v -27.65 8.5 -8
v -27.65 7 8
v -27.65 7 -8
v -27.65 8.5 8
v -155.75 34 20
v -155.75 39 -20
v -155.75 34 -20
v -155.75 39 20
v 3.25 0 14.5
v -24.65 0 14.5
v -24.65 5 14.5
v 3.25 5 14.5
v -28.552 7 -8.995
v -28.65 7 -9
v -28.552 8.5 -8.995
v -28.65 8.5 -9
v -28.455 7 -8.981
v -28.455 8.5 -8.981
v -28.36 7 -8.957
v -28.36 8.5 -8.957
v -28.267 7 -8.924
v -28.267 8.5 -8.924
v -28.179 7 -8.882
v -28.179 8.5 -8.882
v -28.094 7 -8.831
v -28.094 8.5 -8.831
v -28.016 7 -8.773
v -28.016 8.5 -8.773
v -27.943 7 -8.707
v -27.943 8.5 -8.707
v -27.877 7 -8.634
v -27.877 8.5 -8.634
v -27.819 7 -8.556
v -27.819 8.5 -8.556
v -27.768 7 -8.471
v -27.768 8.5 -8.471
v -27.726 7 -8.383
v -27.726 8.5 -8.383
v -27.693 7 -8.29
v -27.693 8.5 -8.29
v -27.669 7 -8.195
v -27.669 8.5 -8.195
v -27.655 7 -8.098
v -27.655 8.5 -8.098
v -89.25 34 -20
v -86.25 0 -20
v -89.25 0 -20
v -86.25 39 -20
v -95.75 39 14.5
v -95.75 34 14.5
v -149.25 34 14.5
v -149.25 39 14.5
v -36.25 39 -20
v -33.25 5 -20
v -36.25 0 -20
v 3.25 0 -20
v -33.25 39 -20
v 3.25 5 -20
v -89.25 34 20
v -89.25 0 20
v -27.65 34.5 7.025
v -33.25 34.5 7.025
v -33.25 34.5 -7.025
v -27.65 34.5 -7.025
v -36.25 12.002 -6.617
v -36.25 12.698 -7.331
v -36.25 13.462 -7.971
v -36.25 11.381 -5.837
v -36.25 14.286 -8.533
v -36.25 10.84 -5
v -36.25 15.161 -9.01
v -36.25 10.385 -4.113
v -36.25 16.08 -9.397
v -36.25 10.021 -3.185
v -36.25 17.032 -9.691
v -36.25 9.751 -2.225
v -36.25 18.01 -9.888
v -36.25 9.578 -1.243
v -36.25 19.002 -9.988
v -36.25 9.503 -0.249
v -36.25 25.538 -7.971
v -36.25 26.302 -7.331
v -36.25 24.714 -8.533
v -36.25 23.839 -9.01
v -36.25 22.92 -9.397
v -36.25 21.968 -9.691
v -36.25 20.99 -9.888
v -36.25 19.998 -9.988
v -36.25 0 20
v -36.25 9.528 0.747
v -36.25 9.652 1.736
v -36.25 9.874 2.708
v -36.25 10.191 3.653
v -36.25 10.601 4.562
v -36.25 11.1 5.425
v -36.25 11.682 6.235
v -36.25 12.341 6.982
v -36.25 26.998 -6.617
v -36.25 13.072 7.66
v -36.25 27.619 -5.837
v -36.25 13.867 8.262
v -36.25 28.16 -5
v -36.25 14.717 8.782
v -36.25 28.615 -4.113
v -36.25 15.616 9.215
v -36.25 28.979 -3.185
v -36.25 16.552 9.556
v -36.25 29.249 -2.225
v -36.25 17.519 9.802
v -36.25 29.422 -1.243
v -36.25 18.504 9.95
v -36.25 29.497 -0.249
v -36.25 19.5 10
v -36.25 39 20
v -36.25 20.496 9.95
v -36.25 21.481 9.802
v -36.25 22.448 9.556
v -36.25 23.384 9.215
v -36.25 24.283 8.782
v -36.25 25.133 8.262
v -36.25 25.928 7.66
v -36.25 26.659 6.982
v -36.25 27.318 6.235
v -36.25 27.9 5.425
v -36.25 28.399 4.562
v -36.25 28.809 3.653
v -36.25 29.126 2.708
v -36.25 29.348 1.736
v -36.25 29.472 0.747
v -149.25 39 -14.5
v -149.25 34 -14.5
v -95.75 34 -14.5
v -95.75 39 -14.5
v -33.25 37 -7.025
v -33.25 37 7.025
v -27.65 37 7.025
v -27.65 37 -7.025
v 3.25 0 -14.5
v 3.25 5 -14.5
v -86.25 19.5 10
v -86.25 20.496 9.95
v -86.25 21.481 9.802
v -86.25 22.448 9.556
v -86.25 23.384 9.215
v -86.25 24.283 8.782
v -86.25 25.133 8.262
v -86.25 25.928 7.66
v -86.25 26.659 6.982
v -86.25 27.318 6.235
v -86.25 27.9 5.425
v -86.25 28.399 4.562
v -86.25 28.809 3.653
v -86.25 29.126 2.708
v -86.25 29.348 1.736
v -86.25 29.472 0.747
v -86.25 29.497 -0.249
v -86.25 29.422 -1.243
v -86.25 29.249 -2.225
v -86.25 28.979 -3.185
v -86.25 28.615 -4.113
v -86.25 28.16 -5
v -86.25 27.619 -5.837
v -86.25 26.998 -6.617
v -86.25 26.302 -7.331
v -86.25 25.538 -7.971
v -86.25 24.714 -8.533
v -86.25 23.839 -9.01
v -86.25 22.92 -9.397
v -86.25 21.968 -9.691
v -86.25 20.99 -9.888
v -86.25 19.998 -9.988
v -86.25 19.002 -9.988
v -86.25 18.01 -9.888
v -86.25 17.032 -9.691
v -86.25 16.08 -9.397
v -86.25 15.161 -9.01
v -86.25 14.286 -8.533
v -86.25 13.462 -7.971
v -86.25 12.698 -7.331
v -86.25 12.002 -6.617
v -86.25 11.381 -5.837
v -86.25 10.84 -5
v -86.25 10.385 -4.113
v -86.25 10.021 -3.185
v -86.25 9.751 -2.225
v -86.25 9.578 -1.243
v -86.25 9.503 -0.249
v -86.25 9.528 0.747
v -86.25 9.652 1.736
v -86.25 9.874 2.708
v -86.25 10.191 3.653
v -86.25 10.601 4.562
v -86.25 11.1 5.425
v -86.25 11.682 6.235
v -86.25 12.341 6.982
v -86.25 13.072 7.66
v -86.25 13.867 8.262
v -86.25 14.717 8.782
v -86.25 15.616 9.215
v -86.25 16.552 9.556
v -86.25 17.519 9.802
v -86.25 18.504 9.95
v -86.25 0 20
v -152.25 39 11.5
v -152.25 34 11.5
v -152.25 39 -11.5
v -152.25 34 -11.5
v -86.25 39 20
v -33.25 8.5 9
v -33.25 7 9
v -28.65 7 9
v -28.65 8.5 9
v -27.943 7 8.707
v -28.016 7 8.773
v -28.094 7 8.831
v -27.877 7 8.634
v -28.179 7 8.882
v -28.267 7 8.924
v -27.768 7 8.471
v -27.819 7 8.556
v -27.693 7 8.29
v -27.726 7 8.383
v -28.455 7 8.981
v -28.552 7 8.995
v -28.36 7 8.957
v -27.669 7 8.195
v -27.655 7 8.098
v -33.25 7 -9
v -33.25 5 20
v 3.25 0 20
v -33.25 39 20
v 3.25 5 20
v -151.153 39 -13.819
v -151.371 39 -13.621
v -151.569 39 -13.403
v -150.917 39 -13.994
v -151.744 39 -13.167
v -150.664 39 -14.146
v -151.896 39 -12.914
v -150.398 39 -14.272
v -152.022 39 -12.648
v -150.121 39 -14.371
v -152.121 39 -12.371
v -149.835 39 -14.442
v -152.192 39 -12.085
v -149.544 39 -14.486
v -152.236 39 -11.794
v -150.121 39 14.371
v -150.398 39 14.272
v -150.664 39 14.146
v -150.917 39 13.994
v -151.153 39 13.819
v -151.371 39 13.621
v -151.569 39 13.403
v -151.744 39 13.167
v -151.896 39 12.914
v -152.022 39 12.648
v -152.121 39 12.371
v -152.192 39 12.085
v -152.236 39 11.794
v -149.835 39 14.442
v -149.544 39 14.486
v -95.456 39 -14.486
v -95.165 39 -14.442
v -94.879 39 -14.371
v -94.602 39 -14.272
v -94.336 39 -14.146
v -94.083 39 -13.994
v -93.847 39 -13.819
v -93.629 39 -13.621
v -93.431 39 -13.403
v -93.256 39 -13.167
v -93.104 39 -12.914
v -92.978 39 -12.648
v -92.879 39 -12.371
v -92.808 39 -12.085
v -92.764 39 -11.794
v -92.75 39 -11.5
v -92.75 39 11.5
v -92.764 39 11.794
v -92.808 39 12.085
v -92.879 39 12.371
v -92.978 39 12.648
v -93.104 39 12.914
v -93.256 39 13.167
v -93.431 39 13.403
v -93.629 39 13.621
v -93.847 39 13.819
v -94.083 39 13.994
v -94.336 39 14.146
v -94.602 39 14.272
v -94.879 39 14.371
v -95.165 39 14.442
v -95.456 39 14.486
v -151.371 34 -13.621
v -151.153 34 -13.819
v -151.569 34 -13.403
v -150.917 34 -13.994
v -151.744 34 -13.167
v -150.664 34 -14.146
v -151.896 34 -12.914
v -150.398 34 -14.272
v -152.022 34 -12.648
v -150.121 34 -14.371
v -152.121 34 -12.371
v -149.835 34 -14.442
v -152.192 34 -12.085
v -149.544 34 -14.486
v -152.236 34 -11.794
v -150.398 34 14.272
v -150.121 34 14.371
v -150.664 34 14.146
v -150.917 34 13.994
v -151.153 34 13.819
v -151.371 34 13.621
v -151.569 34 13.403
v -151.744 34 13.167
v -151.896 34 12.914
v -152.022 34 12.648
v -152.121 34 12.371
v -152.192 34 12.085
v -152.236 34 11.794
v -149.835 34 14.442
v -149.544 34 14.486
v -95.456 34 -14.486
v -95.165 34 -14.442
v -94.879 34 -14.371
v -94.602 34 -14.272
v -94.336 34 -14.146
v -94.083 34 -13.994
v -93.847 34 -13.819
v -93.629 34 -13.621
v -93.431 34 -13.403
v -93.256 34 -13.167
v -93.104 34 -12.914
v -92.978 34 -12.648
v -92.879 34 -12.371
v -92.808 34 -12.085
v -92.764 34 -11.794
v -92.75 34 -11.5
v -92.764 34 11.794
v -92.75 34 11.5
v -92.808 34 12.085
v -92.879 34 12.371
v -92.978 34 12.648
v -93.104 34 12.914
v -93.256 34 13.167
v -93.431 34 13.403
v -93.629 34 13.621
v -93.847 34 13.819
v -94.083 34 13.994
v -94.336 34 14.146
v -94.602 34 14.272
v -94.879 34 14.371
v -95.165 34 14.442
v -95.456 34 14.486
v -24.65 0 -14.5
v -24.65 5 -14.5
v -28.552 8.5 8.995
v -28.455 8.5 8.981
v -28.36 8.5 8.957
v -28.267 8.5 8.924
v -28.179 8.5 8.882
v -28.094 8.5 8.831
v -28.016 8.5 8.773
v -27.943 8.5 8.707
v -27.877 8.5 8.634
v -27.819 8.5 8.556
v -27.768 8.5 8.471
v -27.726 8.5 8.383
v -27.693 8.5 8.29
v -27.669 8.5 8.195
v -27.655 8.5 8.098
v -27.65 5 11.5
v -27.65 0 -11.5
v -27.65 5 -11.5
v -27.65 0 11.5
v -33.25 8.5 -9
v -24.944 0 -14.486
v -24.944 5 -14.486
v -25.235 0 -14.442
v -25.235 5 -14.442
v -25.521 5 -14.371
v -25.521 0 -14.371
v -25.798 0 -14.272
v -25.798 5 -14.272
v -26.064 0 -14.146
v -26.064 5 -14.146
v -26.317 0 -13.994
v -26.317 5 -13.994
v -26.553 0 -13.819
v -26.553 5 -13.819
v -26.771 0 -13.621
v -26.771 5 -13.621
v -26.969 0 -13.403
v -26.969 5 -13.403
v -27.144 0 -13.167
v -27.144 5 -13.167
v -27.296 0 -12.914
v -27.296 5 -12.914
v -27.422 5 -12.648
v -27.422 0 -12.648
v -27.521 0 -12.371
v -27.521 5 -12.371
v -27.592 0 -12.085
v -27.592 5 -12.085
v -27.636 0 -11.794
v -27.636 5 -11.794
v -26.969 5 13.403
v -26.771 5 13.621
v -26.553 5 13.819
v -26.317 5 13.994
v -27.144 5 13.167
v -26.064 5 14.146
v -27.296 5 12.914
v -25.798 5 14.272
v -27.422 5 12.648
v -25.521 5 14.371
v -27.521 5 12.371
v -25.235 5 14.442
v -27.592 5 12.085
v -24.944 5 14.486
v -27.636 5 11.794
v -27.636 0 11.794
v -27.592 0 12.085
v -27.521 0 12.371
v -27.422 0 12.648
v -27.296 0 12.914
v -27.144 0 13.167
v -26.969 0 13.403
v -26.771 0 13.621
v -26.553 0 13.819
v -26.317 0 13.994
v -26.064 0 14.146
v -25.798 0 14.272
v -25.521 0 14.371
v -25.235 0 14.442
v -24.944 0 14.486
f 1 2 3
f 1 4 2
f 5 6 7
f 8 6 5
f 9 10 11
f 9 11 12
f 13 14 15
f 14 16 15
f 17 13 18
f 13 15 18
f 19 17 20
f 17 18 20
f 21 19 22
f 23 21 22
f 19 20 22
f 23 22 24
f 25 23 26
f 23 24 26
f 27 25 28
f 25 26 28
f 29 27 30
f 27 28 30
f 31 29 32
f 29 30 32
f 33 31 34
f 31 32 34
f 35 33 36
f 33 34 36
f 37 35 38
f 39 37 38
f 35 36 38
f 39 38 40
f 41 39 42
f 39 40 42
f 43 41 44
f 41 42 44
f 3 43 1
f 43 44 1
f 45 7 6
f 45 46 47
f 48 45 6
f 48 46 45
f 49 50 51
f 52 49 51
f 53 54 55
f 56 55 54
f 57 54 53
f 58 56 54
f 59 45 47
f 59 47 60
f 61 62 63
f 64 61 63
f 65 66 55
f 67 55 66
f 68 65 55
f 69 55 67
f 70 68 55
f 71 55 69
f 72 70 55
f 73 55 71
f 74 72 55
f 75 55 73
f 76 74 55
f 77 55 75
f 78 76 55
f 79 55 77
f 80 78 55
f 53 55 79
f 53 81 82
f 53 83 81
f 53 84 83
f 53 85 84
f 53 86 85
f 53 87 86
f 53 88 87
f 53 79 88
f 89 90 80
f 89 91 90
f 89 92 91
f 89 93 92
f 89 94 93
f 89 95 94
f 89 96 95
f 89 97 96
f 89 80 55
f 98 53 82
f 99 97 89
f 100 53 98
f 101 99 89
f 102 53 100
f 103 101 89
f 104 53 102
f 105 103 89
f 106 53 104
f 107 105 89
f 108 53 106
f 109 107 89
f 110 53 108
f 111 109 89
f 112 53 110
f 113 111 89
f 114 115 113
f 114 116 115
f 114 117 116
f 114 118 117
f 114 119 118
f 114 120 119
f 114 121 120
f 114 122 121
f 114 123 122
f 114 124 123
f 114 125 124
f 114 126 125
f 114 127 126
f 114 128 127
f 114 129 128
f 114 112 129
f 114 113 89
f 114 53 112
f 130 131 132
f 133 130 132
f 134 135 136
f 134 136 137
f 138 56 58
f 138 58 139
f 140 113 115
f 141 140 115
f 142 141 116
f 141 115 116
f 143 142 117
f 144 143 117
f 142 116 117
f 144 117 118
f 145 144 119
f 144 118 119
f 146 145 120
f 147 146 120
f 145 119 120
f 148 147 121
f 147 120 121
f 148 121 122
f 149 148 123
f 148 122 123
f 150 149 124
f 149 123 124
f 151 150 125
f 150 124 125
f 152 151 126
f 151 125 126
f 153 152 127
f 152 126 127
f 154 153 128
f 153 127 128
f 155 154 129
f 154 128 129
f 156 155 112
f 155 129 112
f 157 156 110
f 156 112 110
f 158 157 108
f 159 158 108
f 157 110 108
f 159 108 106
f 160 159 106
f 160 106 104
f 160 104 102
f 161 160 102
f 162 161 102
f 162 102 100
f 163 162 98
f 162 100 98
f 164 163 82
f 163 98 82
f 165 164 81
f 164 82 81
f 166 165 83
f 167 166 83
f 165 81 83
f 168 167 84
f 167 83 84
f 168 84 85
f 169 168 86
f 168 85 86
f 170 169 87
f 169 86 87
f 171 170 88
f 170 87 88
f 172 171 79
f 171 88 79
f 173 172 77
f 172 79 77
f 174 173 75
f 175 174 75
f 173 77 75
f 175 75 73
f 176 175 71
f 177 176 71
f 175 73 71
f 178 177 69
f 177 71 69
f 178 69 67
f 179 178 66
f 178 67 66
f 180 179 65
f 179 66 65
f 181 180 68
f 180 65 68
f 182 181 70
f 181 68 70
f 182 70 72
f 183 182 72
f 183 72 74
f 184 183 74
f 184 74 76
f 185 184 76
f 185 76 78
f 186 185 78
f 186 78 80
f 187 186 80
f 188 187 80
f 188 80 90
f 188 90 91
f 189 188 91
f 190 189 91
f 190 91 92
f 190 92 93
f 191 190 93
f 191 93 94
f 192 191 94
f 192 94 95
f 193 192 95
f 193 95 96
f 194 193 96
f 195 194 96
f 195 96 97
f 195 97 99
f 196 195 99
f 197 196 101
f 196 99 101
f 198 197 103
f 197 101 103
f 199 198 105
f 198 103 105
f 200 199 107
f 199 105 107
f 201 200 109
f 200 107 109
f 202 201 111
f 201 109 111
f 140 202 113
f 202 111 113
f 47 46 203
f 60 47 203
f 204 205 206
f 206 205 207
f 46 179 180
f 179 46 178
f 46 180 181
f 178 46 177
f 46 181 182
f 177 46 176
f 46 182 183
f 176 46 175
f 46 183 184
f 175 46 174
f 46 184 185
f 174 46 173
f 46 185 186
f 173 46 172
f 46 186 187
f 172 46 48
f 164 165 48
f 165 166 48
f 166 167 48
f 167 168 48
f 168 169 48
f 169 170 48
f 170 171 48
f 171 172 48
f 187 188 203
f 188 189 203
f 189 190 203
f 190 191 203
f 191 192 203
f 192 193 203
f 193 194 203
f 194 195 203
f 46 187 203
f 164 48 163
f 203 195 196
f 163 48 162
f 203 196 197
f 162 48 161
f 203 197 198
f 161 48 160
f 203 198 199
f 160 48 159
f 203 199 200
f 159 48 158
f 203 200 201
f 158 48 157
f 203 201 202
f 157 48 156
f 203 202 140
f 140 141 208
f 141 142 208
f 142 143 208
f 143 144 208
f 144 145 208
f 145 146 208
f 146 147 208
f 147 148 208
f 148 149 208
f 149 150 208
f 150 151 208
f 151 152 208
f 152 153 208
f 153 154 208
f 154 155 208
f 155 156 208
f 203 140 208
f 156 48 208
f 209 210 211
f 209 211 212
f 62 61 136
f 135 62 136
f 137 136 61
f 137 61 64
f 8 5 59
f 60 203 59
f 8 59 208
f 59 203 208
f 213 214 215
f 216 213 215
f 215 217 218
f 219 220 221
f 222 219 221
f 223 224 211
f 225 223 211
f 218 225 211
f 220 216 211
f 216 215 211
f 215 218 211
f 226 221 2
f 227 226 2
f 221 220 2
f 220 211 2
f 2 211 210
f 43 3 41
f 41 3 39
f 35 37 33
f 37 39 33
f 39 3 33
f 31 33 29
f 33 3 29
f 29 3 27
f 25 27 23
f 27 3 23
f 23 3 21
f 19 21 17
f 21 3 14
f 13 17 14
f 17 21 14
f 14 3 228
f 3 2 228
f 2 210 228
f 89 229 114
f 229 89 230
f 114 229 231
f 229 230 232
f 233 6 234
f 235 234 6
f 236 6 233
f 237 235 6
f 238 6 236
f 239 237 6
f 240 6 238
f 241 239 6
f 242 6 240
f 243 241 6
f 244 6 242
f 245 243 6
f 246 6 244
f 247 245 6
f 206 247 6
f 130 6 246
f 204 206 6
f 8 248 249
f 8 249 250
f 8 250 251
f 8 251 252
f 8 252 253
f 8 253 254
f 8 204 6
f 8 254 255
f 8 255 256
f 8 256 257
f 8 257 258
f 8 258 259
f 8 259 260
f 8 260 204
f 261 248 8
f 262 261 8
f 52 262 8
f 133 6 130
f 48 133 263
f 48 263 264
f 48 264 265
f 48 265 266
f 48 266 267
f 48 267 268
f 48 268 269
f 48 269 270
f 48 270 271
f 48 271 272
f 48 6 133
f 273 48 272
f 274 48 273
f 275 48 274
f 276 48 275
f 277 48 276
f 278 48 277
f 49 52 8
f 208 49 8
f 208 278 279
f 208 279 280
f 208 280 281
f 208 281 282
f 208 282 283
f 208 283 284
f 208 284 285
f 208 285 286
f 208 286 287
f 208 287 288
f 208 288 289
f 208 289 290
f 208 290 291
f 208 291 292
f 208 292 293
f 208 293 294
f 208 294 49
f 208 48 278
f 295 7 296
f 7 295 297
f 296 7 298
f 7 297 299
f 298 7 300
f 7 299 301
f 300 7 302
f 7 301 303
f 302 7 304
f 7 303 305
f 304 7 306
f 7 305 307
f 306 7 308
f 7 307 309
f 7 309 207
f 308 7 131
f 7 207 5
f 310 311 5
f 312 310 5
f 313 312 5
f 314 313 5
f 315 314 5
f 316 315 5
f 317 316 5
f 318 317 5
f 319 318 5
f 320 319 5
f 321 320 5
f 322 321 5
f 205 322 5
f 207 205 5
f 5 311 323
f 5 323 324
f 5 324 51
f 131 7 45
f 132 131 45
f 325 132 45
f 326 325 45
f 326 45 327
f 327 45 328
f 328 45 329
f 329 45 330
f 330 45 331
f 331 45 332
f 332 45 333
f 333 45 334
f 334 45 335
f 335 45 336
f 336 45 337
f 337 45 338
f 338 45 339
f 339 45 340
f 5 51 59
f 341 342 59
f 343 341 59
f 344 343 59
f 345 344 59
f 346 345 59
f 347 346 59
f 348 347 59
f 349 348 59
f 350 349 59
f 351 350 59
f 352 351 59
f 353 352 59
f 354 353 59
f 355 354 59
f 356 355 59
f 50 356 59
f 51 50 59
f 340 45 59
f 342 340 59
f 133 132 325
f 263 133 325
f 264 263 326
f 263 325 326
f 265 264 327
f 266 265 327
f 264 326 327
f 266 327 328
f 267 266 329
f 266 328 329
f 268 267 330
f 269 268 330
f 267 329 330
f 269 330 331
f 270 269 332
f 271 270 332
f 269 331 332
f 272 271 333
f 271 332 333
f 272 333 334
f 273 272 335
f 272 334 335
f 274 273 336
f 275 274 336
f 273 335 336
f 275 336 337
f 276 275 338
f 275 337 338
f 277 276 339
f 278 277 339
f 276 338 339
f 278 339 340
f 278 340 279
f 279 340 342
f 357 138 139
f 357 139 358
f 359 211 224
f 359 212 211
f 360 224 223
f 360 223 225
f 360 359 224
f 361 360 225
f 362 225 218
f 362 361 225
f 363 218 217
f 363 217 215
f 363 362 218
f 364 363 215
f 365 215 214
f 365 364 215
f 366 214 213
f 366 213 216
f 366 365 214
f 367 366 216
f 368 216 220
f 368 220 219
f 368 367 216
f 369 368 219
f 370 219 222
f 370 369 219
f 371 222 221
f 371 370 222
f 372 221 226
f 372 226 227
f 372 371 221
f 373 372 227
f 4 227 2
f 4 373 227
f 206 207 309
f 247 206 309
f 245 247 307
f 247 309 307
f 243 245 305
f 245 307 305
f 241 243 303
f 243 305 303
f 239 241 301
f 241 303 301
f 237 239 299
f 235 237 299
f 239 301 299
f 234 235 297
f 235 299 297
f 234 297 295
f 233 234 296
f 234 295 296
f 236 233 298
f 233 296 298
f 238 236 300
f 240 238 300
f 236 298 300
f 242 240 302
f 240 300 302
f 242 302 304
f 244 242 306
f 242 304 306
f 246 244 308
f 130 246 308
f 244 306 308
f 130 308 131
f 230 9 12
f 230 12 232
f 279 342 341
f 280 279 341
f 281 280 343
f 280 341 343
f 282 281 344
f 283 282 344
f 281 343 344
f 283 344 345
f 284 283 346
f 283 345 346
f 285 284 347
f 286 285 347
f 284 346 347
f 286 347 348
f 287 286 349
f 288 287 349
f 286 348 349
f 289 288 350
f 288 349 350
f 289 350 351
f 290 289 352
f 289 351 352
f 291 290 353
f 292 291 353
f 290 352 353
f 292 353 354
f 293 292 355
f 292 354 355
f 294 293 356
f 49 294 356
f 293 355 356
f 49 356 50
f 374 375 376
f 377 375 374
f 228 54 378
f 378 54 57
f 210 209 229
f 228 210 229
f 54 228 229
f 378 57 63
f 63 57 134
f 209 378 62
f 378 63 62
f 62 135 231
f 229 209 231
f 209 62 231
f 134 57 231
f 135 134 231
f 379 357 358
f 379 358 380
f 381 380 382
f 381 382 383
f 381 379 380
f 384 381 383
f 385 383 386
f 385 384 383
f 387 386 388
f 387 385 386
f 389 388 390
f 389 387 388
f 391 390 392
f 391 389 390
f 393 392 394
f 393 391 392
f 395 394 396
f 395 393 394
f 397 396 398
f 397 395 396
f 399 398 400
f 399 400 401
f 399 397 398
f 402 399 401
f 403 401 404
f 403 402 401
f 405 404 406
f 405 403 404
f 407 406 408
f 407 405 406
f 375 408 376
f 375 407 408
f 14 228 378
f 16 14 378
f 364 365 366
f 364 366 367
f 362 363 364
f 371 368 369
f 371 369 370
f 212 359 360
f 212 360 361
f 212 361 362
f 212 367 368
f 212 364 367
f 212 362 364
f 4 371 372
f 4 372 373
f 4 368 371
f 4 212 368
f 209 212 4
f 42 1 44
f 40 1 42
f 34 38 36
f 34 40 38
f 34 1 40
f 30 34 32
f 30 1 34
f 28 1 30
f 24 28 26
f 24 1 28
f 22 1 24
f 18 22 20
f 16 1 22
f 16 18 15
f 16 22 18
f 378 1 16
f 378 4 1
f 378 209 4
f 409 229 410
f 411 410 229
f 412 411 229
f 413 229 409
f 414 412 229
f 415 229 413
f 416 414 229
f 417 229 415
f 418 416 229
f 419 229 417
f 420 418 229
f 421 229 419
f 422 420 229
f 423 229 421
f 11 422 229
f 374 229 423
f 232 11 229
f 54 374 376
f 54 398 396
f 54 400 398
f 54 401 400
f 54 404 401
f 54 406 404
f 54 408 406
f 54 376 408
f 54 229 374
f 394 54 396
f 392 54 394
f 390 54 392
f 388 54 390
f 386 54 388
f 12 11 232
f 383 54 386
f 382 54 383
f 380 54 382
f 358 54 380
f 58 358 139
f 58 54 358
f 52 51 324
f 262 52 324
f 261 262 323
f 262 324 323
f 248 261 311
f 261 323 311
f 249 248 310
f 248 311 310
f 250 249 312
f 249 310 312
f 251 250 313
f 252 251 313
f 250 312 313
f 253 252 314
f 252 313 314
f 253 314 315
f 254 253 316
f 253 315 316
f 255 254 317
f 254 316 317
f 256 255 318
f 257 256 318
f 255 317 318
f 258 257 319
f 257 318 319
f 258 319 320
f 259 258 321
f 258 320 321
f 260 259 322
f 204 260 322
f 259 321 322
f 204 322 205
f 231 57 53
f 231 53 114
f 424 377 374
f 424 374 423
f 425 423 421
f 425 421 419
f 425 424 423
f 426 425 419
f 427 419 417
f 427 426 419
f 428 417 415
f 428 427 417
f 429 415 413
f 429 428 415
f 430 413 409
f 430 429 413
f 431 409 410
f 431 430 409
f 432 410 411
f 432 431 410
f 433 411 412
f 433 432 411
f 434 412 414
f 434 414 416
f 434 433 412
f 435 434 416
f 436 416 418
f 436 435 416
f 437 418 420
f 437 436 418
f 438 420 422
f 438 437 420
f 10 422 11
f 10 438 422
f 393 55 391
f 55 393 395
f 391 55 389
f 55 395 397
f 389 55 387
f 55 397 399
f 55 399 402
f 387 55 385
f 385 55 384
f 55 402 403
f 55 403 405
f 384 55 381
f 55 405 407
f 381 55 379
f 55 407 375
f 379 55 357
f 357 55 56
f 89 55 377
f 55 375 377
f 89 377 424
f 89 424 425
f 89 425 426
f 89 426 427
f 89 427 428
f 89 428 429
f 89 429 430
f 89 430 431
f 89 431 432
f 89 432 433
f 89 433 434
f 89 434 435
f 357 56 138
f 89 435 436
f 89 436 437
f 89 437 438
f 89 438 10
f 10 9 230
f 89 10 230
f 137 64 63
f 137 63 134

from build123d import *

# Parameters (mm, degrees)
SKETCH2_W           = 66.5
SKETCH2_H           = 40
BOSS_EXTRUDE1_DEPTH = 5
SKETCH5_W           = 40
SKETCH5_H           = 39
BOSS_EXTRUDE3_DEPTH = 3
SKETCH11_W          = 14.05
SKETCH11_H          = 2.5
SKETCH11_W_2        = 18
SKETCH11_H_2        = 1.5
BOSS_EXTRUDE4_DEPTH = 5.6
FILLET4_R           = 1
FILLET6_R           = 10
SKETCH12_W          = 30
SKETCH12_H          = 40
CUT_EXTRUDE1_DEPTH  = 10
SKETCH13_R          = 10
BOSS_EXTRUDE5_DEPTH = 50
SKETCH14_W          = 40
SKETCH14_H          = 39
BOSS_EXTRUDE6_DEPTH = 3
SKETCH15_W          = 40
SKETCH15_H          = 5
BOSS_EXTRUDE7_DEPTH = 66.5
CUT_EXTRUDE2_DEPTH  = 5


with BuildPart() as part:
    # Sketch2 → Boss-Extrude1 (new body)
    with BuildSketch(Plane(origin=(0, 0, 0), x_dir=(1, 0, 0), z_dir=(0, 1, 0))):
        Rectangle(SKETCH2_W, SKETCH2_H)
        with BuildLine():
            Line((-27.65, 11.5), (-27.65, -11.5))
            ThreePointArc((-27.65, -11.5), (-26.771320344, -13.621320344), (-24.65, -14.5))
            Line((-24.65, -14.5), (28.85, -14.5))
            ThreePointArc((28.85, -14.5), (30.971320344, -13.621320344), (31.85, -11.5))
            Line((31.85, -11.5), (31.85, 11.5))
            ThreePointArc((31.85, 11.5), (30.971320344, 13.621320344), (28.85, 14.5))
            Line((28.85, 14.5), (-24.65, 14.5))
            ThreePointArc((-24.65, 14.5), (-26.771320344, 13.621320344), (-27.65, 11.5))
        make_face(mode=Mode.SUBTRACT)
    extrude(amount=BOSS_EXTRUDE1_DEPTH)

    # Sketch5 → Boss-Extrude3 (add)
    with BuildSketch(Plane.ZY.offset(33.25)):
        with Locations((0, 19.5)):
            Rectangle(SKETCH5_W, SKETCH5_H)
    extrude(amount=BOSS_EXTRUDE3_DEPTH)

    # Sketch11 → Boss-Extrude4 (add)
    with BuildSketch(Plane(origin=(-33.25, 0, 0), x_dir=(0, 0, -1), z_dir=(1, 0, 0))):
        with Locations((0, 35.75)):
            Rectangle(SKETCH11_W, SKETCH11_H)
        with Locations((0, 7.75)):
            Rectangle(SKETCH11_W_2, SKETCH11_H_2)
    extrude(amount=BOSS_EXTRUDE4_DEPTH)

    # Fillet4
    fillet4_edges = [part.edges().sort_by_distance(p)[0] for p in [
        (-27.65, 7.75, -9),
        (-27.65, 7.75, 9),
    ]]
    fillet(fillet4_edges, radius=FILLET4_R)

    # Fillet6
    fillet6_edges = [part.edges().sort_by_distance(p)[0] for p in [
        (33.25, 2.5, 20),
        (33.25, 2.5, -20),
    ]]
    fillet(fillet6_edges, radius=FILLET6_R)

    # Sketch12 → Cut-Extrude1 (cut)
    with BuildSketch(Plane.XZ):
        with Locations((18.25, 0)):
            Rectangle(SKETCH12_W, SKETCH12_H)
    extrude(amount=-CUT_EXTRUDE1_DEPTH, mode=Mode.SUBTRACT)

    # Sketch13 → Boss-Extrude5 (add)
    with BuildSketch(Plane.ZY.offset(36.25)):
        with Locations((0, 19.5)):
            Circle(SKETCH13_R)
    extrude(amount=BOSS_EXTRUDE5_DEPTH)

    # Sketch14 → Boss-Extrude6 (add)
    with BuildSketch(Plane.ZY.offset(86.25)):
        with Locations((0, 19.5)):
            Rectangle(SKETCH14_W, SKETCH14_H)
    extrude(amount=BOSS_EXTRUDE6_DEPTH)

    # Sketch15 → Boss-Extrude7 (add)
    with BuildSketch(Plane.ZY.offset(89.25)):
        with Locations((0, 36.5)):
            Rectangle(SKETCH15_W, SKETCH15_H)
    extrude(amount=BOSS_EXTRUDE7_DEPTH)

    # Sketch16 → Cut-Extrude2 (cut)
    with BuildSketch(Plane.XZ.offset(-34)):
        with BuildLine():
            Line((-152.25, 11.5), (-152.25, -11.5))
            ThreePointArc((-152.25, -11.5), (-151.371320344, -13.621320344), (-149.25, -14.5))
            Line((-149.25, -14.5), (-95.75, -14.5))
            ThreePointArc((-95.75, -14.5), (-93.628679656, -13.621320344), (-92.75, -11.5))
            Line((-92.75, -11.5), (-92.75, 11.5))
            ThreePointArc((-92.75, 11.5), (-93.628679656, 13.621320344), (-95.75, 14.5))
            Line((-95.75, 14.5), (-149.25, 14.5))
            ThreePointArc((-149.25, 14.5), (-151.371320344, 13.621320344), (-152.25, 11.5))
        make_face()
    extrude(amount=-CUT_EXTRUDE2_DEPTH, mode=Mode.SUBTRACT)


solid = part.part
